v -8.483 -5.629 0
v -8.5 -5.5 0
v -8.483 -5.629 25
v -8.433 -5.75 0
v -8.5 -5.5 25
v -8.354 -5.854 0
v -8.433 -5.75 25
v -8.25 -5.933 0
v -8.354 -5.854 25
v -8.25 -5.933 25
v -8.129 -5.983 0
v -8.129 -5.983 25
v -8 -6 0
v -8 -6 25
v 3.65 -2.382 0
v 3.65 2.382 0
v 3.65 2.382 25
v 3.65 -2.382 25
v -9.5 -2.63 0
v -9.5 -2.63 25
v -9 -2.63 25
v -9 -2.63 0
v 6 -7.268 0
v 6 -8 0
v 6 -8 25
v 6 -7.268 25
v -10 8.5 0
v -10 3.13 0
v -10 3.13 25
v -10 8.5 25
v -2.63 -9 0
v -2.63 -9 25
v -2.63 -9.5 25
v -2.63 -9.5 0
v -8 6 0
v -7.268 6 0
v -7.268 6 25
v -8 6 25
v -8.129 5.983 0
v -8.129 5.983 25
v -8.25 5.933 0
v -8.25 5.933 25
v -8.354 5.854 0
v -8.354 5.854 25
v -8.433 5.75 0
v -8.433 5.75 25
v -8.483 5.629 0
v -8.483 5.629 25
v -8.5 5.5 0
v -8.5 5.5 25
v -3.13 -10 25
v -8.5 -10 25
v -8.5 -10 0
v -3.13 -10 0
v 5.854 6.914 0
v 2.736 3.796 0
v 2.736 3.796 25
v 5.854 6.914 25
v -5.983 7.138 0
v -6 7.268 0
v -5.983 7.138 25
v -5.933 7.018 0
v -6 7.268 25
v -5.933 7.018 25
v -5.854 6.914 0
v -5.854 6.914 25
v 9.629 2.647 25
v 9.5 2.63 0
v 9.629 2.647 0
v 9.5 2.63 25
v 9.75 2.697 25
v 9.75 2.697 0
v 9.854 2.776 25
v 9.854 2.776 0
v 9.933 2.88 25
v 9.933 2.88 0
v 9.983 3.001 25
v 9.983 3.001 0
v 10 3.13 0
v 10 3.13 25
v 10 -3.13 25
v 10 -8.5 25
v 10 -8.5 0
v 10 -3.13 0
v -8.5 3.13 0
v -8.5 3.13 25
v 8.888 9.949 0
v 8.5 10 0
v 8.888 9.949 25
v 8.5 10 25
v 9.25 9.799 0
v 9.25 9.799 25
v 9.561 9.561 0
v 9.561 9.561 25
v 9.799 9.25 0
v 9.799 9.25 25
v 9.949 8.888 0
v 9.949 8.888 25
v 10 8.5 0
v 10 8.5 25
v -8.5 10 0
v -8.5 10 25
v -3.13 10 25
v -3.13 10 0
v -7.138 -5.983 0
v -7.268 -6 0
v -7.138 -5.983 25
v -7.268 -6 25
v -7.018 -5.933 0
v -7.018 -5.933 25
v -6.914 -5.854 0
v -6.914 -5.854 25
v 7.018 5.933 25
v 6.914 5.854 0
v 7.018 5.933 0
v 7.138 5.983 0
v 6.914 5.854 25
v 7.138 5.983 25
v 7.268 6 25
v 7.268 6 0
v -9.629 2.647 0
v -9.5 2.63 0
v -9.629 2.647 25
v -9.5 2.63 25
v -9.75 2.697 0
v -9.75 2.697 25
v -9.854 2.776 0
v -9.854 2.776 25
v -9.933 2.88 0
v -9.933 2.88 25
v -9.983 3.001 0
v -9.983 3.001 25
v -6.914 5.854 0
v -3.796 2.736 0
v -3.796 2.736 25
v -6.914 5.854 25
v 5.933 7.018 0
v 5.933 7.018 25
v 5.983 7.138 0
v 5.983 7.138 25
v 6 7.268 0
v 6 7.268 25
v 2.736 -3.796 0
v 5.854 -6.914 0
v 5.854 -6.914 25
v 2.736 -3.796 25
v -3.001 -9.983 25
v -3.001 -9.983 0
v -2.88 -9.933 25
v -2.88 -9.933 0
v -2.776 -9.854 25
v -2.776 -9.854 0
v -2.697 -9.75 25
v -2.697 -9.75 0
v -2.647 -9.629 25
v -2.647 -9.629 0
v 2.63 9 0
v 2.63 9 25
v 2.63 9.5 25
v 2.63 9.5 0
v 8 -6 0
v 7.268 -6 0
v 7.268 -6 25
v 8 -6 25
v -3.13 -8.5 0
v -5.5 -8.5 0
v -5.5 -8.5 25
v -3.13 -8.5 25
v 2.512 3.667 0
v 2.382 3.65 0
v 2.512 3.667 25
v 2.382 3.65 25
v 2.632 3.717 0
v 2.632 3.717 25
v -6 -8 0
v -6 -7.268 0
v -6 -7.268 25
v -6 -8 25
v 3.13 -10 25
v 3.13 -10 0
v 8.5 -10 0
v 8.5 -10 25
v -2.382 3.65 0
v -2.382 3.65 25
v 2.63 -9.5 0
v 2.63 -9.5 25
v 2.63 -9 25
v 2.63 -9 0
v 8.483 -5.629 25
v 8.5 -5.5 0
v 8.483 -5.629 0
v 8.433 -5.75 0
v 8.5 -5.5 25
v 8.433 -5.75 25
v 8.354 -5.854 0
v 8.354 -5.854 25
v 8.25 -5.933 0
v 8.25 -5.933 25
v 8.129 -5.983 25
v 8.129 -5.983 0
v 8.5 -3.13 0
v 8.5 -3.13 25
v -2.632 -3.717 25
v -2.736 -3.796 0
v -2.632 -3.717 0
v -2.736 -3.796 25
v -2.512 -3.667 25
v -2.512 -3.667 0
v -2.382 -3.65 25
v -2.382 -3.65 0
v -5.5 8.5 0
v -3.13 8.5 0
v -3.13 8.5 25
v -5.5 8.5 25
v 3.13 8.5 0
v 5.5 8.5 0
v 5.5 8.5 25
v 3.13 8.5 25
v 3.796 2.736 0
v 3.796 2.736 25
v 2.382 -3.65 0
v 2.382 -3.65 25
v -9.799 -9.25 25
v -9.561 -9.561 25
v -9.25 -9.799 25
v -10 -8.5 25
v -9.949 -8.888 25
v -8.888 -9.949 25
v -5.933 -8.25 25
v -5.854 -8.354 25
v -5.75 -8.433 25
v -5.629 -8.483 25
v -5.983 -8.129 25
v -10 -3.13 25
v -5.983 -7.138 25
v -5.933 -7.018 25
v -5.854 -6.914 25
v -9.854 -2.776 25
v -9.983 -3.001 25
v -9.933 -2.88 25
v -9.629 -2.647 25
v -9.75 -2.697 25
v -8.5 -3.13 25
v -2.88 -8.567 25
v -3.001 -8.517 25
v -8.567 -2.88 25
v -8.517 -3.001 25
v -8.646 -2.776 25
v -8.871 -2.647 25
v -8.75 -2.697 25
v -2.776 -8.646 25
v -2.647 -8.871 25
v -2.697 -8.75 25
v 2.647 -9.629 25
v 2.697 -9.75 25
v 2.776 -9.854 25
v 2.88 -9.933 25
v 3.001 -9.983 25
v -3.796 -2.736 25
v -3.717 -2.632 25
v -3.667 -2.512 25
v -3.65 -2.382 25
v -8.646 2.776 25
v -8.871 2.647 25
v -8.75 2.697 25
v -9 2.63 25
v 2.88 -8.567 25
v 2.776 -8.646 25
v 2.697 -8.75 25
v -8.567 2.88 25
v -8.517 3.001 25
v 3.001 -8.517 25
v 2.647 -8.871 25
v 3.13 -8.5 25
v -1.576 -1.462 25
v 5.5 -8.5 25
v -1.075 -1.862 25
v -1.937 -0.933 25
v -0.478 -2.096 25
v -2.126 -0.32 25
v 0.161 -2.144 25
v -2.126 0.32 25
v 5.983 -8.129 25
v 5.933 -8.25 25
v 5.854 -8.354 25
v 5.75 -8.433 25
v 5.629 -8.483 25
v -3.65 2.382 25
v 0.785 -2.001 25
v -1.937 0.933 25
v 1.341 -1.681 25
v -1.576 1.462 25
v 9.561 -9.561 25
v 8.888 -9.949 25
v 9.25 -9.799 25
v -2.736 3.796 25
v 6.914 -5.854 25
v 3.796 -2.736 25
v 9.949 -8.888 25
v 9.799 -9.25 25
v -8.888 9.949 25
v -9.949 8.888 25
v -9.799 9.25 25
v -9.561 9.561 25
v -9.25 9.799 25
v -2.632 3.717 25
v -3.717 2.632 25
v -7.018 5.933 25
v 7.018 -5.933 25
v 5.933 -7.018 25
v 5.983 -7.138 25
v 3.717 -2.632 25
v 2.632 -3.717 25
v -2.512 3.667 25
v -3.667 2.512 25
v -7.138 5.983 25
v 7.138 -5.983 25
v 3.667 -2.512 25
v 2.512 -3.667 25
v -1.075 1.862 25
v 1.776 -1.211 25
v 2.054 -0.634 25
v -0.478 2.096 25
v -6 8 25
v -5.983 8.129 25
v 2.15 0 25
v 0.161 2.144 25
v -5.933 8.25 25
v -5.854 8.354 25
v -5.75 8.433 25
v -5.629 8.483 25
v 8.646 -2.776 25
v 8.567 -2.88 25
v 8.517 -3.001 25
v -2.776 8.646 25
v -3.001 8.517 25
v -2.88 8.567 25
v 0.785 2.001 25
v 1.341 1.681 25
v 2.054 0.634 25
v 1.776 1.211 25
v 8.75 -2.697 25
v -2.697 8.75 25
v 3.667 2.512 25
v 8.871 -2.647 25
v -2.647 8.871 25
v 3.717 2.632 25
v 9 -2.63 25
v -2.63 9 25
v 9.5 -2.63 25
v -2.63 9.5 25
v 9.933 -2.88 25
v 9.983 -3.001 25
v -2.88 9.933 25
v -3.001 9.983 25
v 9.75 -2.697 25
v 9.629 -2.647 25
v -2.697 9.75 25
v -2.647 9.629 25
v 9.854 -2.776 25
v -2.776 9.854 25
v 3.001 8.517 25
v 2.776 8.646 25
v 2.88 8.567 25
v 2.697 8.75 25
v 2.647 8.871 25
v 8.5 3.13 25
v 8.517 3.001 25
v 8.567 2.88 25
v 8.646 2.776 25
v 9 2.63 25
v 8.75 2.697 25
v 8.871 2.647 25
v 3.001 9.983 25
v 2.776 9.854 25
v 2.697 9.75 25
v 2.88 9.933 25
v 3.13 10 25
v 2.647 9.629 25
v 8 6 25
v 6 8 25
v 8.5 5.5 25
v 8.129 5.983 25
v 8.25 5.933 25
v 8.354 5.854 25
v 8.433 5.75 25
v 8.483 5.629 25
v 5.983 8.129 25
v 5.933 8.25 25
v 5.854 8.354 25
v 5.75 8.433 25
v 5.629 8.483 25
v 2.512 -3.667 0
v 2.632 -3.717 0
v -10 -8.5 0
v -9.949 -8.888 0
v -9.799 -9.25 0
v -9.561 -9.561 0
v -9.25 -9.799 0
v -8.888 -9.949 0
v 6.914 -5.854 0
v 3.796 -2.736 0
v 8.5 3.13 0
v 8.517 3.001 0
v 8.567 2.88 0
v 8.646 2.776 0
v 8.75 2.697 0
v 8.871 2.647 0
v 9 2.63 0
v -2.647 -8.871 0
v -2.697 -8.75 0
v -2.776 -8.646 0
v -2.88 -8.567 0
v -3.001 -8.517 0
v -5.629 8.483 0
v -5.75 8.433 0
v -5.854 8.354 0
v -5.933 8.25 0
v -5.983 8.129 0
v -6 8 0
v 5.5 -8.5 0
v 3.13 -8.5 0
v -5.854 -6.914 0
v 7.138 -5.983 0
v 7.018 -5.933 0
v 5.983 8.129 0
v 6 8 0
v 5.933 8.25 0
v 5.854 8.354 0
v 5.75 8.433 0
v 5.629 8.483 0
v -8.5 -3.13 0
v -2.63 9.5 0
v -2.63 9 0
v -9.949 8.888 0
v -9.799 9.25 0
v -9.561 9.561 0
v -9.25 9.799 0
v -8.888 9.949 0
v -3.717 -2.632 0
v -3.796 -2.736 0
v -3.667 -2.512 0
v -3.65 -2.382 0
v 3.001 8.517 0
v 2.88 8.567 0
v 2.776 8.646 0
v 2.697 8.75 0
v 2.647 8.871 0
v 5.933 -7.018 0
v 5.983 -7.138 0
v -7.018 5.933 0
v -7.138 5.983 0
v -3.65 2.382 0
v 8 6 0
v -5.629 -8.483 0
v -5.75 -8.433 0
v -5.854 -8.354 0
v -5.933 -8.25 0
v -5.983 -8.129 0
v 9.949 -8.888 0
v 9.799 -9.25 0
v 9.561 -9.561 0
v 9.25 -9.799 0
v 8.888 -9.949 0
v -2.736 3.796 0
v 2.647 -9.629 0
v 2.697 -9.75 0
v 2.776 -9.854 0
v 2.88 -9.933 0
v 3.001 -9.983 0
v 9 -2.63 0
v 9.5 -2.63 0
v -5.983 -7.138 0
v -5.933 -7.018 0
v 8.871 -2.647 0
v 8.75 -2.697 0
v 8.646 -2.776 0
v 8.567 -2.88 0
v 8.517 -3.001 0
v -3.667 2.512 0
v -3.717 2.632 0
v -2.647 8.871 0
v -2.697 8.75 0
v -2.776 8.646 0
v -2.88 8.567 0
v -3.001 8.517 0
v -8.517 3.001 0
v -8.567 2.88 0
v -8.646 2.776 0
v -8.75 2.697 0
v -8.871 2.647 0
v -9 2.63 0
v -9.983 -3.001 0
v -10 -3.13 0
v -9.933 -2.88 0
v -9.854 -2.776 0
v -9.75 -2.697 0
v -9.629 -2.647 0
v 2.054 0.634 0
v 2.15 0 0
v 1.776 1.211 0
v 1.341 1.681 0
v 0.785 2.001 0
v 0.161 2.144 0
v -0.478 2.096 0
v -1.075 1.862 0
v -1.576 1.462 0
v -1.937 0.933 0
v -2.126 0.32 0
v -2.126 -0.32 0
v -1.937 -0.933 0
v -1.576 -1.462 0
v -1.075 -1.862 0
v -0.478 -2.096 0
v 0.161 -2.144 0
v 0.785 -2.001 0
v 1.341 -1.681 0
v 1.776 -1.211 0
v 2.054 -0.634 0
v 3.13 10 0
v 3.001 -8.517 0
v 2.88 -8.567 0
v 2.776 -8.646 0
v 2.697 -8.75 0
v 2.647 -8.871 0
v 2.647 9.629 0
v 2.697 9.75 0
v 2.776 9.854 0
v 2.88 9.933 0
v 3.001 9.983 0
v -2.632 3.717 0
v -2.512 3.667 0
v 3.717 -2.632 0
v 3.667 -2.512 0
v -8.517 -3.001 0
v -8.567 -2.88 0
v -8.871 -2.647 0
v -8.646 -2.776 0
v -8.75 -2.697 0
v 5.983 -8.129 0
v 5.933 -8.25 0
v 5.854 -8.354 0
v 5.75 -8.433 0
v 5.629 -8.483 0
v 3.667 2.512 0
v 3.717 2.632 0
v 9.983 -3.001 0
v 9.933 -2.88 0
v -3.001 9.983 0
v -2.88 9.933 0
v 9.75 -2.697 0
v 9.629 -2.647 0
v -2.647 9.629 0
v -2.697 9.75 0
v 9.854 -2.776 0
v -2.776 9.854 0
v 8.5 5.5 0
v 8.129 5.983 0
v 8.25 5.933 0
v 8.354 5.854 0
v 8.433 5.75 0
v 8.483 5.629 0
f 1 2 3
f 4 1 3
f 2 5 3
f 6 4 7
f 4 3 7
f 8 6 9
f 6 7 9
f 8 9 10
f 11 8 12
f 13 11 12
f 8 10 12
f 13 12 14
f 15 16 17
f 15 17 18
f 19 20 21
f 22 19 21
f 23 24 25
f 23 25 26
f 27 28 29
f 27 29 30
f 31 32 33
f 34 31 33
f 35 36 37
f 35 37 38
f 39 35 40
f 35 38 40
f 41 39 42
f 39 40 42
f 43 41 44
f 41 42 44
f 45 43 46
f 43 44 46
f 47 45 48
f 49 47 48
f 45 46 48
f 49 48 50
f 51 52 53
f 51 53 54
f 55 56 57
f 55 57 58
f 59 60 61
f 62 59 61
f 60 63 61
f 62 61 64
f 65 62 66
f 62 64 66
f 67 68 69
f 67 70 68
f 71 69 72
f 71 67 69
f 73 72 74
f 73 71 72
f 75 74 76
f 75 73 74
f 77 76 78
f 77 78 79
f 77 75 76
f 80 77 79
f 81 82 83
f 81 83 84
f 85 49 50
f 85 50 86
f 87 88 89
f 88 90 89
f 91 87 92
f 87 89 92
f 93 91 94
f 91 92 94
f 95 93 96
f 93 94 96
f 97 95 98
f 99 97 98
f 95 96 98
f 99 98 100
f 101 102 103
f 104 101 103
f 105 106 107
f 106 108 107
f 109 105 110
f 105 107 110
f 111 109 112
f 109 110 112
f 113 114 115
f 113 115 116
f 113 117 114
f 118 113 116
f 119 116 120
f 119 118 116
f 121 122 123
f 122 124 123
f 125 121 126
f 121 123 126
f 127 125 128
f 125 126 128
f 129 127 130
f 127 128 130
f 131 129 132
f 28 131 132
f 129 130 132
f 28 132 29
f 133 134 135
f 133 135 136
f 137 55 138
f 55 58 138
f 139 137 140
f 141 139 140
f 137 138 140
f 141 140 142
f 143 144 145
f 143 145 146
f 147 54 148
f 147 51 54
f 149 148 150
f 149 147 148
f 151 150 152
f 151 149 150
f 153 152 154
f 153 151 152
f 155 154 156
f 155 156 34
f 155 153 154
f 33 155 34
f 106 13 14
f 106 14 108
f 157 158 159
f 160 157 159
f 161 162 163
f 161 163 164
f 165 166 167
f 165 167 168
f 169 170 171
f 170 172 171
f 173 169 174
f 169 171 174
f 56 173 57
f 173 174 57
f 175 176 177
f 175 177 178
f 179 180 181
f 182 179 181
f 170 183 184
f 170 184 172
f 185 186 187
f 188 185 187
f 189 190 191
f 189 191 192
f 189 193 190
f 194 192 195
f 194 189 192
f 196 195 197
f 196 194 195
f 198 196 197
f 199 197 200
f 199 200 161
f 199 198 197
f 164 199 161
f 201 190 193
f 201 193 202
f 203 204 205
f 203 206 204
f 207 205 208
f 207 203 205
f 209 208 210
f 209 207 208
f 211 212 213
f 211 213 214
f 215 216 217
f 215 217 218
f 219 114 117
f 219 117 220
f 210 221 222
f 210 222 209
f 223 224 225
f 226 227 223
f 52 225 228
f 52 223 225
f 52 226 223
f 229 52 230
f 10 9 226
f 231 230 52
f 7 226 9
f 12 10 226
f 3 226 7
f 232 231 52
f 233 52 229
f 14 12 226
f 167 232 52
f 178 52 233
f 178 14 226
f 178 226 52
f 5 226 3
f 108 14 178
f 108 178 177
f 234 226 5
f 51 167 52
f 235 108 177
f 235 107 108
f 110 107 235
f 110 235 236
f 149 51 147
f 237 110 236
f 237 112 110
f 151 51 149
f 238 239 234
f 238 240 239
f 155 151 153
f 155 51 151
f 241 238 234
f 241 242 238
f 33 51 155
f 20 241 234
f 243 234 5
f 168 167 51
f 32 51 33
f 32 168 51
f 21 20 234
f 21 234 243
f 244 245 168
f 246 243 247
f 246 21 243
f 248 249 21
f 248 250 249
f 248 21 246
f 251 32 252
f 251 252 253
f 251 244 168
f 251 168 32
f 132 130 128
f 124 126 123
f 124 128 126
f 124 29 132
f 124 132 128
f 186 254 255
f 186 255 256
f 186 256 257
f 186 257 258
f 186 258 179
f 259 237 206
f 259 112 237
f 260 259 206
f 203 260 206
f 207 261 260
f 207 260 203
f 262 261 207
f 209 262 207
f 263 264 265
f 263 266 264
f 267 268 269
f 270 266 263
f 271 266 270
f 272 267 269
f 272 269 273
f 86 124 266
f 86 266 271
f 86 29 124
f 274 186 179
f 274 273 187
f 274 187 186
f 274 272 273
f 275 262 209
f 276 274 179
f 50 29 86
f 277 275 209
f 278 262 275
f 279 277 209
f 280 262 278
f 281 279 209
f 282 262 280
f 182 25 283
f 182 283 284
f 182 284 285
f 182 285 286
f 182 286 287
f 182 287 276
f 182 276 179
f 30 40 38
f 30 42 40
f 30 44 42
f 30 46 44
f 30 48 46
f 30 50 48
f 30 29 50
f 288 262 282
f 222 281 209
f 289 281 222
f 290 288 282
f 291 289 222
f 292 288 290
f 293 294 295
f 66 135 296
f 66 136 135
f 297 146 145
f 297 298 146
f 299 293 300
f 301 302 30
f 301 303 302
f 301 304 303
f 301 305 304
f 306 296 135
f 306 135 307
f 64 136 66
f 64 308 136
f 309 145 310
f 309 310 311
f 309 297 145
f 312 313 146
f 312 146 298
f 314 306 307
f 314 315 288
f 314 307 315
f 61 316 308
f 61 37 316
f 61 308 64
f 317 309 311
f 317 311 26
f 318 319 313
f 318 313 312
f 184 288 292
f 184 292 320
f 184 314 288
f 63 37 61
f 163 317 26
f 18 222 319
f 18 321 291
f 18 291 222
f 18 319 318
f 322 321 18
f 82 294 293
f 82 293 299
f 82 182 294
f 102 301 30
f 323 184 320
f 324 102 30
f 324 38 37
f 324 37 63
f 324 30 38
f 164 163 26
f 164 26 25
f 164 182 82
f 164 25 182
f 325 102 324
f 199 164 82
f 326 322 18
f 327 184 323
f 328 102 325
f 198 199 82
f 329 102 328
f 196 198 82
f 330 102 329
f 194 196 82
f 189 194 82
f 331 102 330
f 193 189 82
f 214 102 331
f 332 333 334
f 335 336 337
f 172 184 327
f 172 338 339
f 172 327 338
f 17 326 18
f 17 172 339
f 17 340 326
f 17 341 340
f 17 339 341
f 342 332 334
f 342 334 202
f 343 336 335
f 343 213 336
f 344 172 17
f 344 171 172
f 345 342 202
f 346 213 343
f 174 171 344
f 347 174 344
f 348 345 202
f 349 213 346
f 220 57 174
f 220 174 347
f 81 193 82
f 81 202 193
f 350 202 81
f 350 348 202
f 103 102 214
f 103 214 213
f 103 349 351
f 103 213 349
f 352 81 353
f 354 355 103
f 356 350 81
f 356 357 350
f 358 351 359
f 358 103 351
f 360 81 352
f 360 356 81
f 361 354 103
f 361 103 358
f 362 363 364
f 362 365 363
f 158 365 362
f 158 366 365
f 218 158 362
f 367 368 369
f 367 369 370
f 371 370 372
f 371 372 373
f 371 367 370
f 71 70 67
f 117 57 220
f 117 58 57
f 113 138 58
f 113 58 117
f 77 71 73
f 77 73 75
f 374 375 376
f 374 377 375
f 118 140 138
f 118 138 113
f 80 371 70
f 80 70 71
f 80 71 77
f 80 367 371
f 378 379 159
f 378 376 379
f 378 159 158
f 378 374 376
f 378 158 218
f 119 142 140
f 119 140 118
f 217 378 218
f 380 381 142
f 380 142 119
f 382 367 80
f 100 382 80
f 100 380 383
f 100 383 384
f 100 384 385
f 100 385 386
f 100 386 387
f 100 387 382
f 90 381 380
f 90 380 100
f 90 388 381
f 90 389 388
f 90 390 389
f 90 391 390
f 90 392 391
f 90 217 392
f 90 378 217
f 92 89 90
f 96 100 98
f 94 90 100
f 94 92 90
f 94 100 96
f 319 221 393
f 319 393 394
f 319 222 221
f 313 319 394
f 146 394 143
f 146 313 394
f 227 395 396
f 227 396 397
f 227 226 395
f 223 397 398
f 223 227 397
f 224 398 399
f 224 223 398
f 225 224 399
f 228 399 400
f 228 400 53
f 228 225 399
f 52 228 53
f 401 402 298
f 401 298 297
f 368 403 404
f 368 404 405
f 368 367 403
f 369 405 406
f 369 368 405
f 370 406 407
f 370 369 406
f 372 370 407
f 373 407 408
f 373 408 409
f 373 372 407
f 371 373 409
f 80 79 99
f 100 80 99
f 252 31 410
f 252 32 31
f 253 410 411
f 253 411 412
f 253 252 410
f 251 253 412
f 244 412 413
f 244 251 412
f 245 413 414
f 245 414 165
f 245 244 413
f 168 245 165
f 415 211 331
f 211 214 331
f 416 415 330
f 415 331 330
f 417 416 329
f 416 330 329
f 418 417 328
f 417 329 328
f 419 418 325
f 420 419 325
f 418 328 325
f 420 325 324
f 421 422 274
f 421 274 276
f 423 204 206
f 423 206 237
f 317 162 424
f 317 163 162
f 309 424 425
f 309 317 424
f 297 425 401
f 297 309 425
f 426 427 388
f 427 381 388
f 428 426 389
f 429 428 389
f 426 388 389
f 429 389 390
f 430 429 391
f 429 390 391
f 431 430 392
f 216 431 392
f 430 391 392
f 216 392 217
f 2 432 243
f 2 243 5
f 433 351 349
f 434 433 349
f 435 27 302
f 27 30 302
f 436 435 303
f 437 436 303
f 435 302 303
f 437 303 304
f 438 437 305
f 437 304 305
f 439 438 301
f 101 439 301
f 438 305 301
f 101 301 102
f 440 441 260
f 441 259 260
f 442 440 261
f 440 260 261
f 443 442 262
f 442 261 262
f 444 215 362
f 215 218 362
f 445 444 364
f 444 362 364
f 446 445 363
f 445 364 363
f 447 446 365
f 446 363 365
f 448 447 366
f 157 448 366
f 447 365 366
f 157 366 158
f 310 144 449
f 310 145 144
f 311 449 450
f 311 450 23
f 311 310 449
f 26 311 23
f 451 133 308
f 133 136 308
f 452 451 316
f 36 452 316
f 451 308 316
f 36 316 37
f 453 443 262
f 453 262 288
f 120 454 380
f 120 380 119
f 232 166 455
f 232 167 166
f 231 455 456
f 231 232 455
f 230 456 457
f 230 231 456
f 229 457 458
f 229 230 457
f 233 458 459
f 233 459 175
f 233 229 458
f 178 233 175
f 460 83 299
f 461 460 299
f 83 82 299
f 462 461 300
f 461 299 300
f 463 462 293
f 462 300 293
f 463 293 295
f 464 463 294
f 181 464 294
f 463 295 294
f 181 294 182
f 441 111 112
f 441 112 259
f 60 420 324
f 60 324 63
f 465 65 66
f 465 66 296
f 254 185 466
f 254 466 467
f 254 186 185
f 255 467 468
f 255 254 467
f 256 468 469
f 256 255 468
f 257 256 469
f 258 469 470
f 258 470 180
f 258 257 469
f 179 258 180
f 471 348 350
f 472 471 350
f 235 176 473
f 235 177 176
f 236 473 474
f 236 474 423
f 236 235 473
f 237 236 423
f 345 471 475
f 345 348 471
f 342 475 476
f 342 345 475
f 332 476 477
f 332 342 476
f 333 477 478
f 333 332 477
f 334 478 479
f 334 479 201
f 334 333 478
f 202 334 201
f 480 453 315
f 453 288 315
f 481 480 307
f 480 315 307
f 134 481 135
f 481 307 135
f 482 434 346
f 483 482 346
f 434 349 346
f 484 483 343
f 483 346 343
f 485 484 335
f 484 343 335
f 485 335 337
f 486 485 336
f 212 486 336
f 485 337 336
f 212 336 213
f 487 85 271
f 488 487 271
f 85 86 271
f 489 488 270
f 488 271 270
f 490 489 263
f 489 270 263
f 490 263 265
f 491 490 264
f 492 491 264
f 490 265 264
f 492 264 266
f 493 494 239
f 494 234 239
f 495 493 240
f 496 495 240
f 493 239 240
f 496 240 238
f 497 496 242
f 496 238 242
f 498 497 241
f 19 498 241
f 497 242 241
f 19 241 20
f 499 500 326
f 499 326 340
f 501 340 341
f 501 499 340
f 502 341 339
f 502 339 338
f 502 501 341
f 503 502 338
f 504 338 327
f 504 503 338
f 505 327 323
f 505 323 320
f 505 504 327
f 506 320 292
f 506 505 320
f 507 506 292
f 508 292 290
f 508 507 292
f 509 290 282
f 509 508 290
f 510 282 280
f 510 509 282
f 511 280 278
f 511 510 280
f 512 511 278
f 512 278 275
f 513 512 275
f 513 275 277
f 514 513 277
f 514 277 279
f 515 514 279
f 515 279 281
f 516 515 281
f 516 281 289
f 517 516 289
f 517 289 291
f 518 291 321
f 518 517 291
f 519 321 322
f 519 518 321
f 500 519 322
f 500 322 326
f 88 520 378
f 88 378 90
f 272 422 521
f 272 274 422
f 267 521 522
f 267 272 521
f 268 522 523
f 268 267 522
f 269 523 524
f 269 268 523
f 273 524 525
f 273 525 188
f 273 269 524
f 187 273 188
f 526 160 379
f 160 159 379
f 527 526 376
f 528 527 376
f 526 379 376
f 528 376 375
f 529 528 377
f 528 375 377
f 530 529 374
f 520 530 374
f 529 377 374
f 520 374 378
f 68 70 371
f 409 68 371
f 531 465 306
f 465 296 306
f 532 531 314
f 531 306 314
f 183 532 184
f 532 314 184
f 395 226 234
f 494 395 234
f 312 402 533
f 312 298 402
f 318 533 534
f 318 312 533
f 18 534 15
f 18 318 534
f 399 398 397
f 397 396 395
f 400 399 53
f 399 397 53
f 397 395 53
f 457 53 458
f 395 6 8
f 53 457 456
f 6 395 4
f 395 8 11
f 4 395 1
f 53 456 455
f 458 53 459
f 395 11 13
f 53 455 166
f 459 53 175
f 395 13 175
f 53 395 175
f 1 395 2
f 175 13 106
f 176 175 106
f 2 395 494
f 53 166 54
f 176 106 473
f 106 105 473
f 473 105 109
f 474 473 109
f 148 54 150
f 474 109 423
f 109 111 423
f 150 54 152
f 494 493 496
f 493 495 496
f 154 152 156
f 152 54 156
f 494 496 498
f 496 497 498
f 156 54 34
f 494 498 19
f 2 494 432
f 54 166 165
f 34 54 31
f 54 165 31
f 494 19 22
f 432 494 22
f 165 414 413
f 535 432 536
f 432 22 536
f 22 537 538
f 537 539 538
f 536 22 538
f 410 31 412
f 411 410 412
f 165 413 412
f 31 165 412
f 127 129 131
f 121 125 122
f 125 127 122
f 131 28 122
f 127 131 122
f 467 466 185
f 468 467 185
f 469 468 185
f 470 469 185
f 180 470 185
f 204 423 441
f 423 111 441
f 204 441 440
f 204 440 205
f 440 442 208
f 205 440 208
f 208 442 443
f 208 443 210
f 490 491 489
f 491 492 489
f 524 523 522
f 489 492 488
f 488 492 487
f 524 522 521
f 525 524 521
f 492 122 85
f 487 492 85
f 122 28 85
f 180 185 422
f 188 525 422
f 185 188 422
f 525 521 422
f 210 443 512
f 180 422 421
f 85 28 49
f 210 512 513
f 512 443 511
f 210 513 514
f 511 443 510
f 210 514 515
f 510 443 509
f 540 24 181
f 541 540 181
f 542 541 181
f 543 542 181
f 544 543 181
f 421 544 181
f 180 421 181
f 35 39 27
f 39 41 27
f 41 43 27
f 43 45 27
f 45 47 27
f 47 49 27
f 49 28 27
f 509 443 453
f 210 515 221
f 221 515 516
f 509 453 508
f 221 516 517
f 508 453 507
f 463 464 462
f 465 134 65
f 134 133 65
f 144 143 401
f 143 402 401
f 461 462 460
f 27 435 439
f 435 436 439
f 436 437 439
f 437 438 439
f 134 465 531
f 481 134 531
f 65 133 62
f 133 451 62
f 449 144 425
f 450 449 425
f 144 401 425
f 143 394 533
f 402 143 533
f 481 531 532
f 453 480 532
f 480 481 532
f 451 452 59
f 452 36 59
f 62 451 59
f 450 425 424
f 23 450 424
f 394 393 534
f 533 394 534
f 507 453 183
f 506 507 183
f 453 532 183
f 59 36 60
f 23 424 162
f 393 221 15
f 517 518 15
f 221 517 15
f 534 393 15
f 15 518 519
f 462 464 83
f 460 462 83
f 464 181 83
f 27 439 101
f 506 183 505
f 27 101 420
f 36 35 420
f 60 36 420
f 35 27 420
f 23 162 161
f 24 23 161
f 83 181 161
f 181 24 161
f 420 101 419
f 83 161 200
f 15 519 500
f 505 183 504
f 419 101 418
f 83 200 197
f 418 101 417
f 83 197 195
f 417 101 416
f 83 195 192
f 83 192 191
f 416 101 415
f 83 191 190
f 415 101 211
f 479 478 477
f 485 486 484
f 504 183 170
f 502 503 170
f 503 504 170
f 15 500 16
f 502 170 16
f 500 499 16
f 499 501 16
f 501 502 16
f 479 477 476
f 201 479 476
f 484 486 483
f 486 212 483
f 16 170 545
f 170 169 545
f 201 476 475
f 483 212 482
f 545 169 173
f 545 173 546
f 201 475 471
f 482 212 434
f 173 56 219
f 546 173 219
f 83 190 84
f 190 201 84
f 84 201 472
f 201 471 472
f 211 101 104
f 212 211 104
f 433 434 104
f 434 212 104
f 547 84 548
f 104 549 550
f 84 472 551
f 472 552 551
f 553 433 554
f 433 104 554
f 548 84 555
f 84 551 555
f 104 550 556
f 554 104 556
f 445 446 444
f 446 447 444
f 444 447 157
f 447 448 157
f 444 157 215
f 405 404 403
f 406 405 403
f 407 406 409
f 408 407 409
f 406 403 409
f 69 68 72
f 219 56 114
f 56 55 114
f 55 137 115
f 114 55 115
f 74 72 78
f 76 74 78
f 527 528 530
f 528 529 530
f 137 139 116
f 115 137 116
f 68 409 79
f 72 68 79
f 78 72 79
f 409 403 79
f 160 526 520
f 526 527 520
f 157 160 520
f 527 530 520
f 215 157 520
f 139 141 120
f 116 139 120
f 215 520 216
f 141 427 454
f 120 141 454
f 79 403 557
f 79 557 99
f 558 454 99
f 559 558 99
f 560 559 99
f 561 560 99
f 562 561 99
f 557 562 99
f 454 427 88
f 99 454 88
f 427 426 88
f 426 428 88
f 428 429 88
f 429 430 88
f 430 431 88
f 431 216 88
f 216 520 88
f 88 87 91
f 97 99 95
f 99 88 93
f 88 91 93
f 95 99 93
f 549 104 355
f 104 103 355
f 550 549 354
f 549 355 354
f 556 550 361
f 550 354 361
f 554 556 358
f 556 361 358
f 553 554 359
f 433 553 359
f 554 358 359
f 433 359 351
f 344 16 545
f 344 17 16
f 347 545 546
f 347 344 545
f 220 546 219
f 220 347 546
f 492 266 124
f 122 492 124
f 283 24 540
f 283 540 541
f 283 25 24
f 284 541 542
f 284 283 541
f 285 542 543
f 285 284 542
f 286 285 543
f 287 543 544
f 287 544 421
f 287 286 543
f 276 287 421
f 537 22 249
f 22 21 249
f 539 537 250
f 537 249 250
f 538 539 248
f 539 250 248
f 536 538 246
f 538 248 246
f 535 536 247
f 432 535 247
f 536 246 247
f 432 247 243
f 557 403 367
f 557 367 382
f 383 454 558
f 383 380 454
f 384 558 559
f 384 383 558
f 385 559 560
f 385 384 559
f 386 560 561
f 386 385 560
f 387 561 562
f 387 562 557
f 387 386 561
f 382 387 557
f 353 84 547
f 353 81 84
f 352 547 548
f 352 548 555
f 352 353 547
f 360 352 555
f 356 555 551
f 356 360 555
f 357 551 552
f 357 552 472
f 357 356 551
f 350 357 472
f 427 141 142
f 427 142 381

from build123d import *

# Parameters (mm, degrees)
F0_W     = 20
F0_H     = 20
F0_R     = 2.15
F2_DEPTH = 25
F3_DEPTH = 25.001
F4_R     = 1.5
F5_R     = 0.5


with BuildPart() as f2:
    # F0 (on Top) → F2 (new body)
    with BuildSketch(Plane.XY):
        Rectangle(F0_W, F0_H)
        Circle(F0_R, mode=Mode.SUBTRACT)
    extrude(amount=F2_DEPTH)

    # F1 (on face) → F3 (cut, through all)
    with BuildSketch(Plane.XY):
        Polygon((-8.5, 2.63), (-10, 2.63), (-10, -2.63), (-8.5, -2.63), (-8.5, -6), (-7.06066, -6), (-3.65, -2.58934), (-3.65, 2.58934), (-7.06066, 6), (-8.5, 6), align=None)
        Polygon((-2.63, -8.5), (-2.63, -10), (2.63, -10), (2.63, -8.5), (6, -8.5), (6, -7.06066), (2.58934, -3.65), (-2.58934, -3.65), (-6, -7.06066), (-6, -8.5), align=None)
        Polygon((10, -2.63), (10, 2.63), (8.5, 2.63), (8.5, 6), (7.06066, 6), (3.65, 2.58934), (3.65, -2.58934), (7.06066, -6), (8.5, -6), (8.5, -2.63), align=None)
        Polygon((2.63, 10), (-2.63, 10), (-2.63, 8.5), (-6, 8.5), (-6, 7.06066), (-2.58934, 3.65), (2.58934, 3.65), (6, 7.06066), (6, 8.5), (2.63, 8.5), align=None)
    extrude(amount=F3_DEPTH, mode=Mode.SUBTRACT)

    # F4
    f4_edges = [f2.edges().sort_by_distance(p)[0] for p in [
        (10, -10, 12.5),
        (-10, -10, 12.5),
        (10, 10, 12.5),
        (-10, 10, 12.5),
    ]]
    fillet(f4_edges, radius=F4_R)

    # F5
    f5_edges = [f2.edges().sort_by_distance(p)[0] for p in [
        (-2.63, -10, 12.5),
        (-10, 2.63, 12.5),
        (-2.63, 10, 12.5),
        (2.63, -10, 12.5),
        (10, 2.63, 12.5),
        (10, -2.63, 12.5),
        (-10, -2.63, 12.5),
        (2.63, 10, 12.5),
        (-6, -8.5, 12.5),
        (-2.63, -8.5, 12.5),
        (2.63, -8.5, 12.5),
        (-8.5, 2.63, 12.5),
        (-8.5, -2.63, 12.5),
        (8.5, -2.63, 12.5),
        (8.5, 2.63, 12.5),
        (2.63, 8.5, 12.5),
        (6, 8.5, 12.5),
        (8.5, 6, 12.5),
        (7.06066, 6, 12.5),
        (6, 7.06066, 12.5),
        (-2.58934, -3.65, 12.5),
        (2.58934, -3.65, 12.5),
        (3.65, 2.58934, 12.5),
        (3.65, -2.58934, 12.5),
        (-3.65, -2.58934, 12.5),
        (-3.65, 2.58934, 12.5),
        (2.58934, 3.65, 12.5),
        (-2.58934, 3.65, 12.5),
        (-6, 8.5, 12.5),
        (-6, 7.06066, 12.5),
        (-2.63, 8.5, 12.5),
        (8.5, -6, 12.5),
        (7.06066, -6, 12.5),
        (-8.5, -6, 12.5),
        (-7.06066, -6, 12.5),
        (-6, -7.06066, 12.5),
        (6, -7.06066, 12.5),
        (6, -8.5, 12.5),
        (-8.5, 6, 12.5),
        (-7.06066, 6, 12.5),
    ]]
    fillet(f5_edges, radius=F5_R)


solid = f2.part
